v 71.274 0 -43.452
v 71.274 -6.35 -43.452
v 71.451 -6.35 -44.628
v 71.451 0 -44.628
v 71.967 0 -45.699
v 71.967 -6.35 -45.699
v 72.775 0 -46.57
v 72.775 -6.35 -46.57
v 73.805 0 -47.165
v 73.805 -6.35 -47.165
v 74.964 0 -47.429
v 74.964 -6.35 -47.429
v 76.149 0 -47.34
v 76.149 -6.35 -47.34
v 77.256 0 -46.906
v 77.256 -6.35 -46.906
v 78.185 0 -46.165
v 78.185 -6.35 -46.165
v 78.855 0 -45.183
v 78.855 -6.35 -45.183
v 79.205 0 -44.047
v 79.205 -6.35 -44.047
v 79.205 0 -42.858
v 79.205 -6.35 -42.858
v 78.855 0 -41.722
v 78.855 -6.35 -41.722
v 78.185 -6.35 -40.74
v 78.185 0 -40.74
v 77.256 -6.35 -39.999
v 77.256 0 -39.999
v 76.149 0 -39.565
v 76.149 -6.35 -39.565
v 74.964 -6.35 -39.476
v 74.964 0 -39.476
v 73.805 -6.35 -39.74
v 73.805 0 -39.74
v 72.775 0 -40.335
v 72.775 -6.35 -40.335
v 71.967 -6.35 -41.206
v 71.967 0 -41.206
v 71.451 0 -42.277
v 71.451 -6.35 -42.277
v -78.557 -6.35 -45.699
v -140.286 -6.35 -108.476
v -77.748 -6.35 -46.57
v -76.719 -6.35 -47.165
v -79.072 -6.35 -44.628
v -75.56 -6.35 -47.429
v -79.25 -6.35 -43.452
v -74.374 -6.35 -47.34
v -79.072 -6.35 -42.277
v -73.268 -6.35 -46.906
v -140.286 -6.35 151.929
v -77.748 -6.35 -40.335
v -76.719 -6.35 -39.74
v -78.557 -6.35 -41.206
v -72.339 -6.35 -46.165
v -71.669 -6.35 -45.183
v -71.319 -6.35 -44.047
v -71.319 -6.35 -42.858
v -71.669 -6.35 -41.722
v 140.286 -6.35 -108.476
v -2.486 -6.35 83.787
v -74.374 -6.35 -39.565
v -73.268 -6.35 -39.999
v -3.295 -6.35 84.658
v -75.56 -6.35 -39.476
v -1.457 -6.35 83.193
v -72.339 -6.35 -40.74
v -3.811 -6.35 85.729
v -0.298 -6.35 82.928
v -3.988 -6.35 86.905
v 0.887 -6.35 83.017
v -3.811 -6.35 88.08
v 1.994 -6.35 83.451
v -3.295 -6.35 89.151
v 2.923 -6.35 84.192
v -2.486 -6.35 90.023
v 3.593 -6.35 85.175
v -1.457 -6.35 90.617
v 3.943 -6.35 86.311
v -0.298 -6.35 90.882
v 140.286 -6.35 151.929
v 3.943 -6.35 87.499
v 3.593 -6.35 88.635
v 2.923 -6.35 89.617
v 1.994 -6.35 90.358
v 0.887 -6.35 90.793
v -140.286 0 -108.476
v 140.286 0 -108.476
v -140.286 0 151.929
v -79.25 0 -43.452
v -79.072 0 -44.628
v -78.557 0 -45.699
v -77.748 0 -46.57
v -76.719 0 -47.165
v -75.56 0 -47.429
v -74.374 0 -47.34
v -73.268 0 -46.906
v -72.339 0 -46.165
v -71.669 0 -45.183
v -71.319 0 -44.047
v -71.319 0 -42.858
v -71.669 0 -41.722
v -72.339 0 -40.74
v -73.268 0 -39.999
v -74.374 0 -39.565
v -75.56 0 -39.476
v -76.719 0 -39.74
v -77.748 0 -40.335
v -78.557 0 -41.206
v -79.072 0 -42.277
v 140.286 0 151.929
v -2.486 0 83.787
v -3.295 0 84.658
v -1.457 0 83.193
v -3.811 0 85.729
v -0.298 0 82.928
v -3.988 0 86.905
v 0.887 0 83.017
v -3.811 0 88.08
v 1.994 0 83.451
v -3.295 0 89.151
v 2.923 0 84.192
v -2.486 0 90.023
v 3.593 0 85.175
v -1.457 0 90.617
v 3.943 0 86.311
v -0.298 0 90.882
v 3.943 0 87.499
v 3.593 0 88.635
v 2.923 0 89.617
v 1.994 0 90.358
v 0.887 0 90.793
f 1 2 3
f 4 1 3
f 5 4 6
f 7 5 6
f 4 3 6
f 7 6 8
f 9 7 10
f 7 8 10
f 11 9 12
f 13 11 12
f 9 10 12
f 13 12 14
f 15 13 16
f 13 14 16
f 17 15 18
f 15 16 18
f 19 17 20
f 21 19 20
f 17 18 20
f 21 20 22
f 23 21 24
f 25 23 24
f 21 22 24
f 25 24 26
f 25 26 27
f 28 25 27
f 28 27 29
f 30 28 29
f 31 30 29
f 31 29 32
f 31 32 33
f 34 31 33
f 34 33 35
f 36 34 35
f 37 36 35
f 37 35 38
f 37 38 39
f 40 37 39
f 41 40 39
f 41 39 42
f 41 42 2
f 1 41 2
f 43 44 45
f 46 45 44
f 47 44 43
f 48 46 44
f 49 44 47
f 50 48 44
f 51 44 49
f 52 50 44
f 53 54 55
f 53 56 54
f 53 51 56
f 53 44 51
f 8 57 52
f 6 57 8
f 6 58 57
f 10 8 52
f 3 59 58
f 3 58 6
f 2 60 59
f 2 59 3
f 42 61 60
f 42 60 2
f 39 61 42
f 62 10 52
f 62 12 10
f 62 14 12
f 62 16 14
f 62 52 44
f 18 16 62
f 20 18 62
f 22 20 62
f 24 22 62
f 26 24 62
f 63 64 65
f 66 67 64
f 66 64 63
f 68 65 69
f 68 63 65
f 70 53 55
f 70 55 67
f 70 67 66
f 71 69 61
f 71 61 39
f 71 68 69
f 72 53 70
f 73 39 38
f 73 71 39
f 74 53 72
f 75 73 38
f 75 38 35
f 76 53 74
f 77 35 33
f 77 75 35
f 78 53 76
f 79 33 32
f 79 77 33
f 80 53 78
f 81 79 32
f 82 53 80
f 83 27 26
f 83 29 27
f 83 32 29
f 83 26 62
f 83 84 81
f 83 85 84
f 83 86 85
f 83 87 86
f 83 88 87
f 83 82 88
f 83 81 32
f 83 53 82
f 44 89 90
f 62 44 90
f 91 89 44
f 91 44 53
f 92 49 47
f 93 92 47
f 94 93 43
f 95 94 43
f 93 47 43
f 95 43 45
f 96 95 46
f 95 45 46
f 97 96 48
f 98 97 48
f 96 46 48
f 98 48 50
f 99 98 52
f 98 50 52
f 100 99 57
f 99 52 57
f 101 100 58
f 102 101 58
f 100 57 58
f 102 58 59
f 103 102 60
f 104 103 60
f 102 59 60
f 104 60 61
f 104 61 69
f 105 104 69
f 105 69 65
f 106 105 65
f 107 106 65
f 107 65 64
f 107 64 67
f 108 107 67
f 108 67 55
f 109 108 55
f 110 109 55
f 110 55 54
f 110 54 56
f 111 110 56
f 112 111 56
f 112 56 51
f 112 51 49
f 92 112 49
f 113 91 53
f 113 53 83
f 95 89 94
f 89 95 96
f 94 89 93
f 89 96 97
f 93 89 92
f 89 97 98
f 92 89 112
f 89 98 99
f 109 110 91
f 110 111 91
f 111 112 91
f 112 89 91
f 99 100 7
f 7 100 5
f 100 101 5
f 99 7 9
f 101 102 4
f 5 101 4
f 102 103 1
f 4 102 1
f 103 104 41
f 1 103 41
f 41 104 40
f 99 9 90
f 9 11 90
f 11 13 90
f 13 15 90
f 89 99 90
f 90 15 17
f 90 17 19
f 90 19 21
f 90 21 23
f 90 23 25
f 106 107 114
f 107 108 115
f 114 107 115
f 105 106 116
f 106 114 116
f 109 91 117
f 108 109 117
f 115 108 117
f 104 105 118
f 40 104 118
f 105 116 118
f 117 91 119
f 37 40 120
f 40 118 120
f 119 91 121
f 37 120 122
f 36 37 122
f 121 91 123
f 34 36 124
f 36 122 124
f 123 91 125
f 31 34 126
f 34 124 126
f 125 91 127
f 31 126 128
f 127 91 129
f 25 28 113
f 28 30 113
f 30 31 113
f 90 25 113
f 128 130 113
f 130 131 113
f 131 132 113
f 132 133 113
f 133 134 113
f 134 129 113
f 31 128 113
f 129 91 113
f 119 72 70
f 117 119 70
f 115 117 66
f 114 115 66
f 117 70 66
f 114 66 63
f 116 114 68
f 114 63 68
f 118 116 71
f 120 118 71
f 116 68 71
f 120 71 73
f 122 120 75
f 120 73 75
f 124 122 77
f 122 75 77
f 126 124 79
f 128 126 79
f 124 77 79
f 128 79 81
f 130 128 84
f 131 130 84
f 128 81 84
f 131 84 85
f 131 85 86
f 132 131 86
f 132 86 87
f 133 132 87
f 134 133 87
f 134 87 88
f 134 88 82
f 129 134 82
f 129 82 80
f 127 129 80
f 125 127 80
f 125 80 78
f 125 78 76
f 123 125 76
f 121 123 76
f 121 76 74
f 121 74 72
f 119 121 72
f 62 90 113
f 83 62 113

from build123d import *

# Parameters (mm, degrees)
F0_W     = 280.5716638824
F0_H     = 260.4053167929
F1_DEPTH = 6.35
F2_D     = 7.9756


with BuildPart() as f1:
    # F0 (on Front) → F1 (new body)
    with BuildSketch(Plane.XZ):
        with Locations((0, 21.7262194655)):
            Rectangle(F0_W, F0_H)
        with BuildLine():
            ThreePointArc((-75.2618319412, -51.326438931), (-82.0809159706, -47.389438931), (-82.0809159706, -39.515438931))
            Line((-82.0809159706, -39.515438931), (-6.8190840294, 90.8418778619))
            ThreePointArc((-6.8190840294, 90.8418778619), (0, 94.7788778619), (6.8190840294, 90.8418778619))
            Line((6.8190840294, 90.8418778619), (82.0809159706, -39.515438931))
            ThreePointArc((82.0809159706, -39.515438931), (82.0809159706, -47.389438931), (75.2618319412, -51.326438931))
            Line((75.2618319412, -51.326438931), (-75.2618319412, -51.326438931))
        make_face(mode=Mode.SUBTRACT)
        with BuildLine():
            Line((-6.8190840294, 90.8418778619), (-82.0809159706, -39.515438931))
            ThreePointArc((-82.0809159706, -39.515438931), (-82.0809159706, -47.389438931), (-75.2618319412, -51.326438931))
            Line((-75.2618319412, -51.326438931), (75.2618319412, -51.326438931))
            ThreePointArc((75.2618319412, -51.326438931), (82.0809159706, -47.389438931), (82.0809159706, -39.515438931))
            Line((82.0809159706, -39.515438931), (6.8190840294, 90.8418778619))
            ThreePointArc((6.8190840294, 90.8418778619), (0, 94.7788778619), (-6.8190840294, 90.8418778619))
        make_face()
    extrude(amount=F1_DEPTH)

    # F2 (through all)
    with Locations(Plane(origin=(0, 0, 0), x_dir=(1, 0, 0), z_dir=(0, 1, 0))):
        with Locations((0, -86.9048778619), (-75.2618319412, 43.452438931), (75.2618319412, 43.452438931)):
            Hole(F2_D / 2)


solid = f1.part
